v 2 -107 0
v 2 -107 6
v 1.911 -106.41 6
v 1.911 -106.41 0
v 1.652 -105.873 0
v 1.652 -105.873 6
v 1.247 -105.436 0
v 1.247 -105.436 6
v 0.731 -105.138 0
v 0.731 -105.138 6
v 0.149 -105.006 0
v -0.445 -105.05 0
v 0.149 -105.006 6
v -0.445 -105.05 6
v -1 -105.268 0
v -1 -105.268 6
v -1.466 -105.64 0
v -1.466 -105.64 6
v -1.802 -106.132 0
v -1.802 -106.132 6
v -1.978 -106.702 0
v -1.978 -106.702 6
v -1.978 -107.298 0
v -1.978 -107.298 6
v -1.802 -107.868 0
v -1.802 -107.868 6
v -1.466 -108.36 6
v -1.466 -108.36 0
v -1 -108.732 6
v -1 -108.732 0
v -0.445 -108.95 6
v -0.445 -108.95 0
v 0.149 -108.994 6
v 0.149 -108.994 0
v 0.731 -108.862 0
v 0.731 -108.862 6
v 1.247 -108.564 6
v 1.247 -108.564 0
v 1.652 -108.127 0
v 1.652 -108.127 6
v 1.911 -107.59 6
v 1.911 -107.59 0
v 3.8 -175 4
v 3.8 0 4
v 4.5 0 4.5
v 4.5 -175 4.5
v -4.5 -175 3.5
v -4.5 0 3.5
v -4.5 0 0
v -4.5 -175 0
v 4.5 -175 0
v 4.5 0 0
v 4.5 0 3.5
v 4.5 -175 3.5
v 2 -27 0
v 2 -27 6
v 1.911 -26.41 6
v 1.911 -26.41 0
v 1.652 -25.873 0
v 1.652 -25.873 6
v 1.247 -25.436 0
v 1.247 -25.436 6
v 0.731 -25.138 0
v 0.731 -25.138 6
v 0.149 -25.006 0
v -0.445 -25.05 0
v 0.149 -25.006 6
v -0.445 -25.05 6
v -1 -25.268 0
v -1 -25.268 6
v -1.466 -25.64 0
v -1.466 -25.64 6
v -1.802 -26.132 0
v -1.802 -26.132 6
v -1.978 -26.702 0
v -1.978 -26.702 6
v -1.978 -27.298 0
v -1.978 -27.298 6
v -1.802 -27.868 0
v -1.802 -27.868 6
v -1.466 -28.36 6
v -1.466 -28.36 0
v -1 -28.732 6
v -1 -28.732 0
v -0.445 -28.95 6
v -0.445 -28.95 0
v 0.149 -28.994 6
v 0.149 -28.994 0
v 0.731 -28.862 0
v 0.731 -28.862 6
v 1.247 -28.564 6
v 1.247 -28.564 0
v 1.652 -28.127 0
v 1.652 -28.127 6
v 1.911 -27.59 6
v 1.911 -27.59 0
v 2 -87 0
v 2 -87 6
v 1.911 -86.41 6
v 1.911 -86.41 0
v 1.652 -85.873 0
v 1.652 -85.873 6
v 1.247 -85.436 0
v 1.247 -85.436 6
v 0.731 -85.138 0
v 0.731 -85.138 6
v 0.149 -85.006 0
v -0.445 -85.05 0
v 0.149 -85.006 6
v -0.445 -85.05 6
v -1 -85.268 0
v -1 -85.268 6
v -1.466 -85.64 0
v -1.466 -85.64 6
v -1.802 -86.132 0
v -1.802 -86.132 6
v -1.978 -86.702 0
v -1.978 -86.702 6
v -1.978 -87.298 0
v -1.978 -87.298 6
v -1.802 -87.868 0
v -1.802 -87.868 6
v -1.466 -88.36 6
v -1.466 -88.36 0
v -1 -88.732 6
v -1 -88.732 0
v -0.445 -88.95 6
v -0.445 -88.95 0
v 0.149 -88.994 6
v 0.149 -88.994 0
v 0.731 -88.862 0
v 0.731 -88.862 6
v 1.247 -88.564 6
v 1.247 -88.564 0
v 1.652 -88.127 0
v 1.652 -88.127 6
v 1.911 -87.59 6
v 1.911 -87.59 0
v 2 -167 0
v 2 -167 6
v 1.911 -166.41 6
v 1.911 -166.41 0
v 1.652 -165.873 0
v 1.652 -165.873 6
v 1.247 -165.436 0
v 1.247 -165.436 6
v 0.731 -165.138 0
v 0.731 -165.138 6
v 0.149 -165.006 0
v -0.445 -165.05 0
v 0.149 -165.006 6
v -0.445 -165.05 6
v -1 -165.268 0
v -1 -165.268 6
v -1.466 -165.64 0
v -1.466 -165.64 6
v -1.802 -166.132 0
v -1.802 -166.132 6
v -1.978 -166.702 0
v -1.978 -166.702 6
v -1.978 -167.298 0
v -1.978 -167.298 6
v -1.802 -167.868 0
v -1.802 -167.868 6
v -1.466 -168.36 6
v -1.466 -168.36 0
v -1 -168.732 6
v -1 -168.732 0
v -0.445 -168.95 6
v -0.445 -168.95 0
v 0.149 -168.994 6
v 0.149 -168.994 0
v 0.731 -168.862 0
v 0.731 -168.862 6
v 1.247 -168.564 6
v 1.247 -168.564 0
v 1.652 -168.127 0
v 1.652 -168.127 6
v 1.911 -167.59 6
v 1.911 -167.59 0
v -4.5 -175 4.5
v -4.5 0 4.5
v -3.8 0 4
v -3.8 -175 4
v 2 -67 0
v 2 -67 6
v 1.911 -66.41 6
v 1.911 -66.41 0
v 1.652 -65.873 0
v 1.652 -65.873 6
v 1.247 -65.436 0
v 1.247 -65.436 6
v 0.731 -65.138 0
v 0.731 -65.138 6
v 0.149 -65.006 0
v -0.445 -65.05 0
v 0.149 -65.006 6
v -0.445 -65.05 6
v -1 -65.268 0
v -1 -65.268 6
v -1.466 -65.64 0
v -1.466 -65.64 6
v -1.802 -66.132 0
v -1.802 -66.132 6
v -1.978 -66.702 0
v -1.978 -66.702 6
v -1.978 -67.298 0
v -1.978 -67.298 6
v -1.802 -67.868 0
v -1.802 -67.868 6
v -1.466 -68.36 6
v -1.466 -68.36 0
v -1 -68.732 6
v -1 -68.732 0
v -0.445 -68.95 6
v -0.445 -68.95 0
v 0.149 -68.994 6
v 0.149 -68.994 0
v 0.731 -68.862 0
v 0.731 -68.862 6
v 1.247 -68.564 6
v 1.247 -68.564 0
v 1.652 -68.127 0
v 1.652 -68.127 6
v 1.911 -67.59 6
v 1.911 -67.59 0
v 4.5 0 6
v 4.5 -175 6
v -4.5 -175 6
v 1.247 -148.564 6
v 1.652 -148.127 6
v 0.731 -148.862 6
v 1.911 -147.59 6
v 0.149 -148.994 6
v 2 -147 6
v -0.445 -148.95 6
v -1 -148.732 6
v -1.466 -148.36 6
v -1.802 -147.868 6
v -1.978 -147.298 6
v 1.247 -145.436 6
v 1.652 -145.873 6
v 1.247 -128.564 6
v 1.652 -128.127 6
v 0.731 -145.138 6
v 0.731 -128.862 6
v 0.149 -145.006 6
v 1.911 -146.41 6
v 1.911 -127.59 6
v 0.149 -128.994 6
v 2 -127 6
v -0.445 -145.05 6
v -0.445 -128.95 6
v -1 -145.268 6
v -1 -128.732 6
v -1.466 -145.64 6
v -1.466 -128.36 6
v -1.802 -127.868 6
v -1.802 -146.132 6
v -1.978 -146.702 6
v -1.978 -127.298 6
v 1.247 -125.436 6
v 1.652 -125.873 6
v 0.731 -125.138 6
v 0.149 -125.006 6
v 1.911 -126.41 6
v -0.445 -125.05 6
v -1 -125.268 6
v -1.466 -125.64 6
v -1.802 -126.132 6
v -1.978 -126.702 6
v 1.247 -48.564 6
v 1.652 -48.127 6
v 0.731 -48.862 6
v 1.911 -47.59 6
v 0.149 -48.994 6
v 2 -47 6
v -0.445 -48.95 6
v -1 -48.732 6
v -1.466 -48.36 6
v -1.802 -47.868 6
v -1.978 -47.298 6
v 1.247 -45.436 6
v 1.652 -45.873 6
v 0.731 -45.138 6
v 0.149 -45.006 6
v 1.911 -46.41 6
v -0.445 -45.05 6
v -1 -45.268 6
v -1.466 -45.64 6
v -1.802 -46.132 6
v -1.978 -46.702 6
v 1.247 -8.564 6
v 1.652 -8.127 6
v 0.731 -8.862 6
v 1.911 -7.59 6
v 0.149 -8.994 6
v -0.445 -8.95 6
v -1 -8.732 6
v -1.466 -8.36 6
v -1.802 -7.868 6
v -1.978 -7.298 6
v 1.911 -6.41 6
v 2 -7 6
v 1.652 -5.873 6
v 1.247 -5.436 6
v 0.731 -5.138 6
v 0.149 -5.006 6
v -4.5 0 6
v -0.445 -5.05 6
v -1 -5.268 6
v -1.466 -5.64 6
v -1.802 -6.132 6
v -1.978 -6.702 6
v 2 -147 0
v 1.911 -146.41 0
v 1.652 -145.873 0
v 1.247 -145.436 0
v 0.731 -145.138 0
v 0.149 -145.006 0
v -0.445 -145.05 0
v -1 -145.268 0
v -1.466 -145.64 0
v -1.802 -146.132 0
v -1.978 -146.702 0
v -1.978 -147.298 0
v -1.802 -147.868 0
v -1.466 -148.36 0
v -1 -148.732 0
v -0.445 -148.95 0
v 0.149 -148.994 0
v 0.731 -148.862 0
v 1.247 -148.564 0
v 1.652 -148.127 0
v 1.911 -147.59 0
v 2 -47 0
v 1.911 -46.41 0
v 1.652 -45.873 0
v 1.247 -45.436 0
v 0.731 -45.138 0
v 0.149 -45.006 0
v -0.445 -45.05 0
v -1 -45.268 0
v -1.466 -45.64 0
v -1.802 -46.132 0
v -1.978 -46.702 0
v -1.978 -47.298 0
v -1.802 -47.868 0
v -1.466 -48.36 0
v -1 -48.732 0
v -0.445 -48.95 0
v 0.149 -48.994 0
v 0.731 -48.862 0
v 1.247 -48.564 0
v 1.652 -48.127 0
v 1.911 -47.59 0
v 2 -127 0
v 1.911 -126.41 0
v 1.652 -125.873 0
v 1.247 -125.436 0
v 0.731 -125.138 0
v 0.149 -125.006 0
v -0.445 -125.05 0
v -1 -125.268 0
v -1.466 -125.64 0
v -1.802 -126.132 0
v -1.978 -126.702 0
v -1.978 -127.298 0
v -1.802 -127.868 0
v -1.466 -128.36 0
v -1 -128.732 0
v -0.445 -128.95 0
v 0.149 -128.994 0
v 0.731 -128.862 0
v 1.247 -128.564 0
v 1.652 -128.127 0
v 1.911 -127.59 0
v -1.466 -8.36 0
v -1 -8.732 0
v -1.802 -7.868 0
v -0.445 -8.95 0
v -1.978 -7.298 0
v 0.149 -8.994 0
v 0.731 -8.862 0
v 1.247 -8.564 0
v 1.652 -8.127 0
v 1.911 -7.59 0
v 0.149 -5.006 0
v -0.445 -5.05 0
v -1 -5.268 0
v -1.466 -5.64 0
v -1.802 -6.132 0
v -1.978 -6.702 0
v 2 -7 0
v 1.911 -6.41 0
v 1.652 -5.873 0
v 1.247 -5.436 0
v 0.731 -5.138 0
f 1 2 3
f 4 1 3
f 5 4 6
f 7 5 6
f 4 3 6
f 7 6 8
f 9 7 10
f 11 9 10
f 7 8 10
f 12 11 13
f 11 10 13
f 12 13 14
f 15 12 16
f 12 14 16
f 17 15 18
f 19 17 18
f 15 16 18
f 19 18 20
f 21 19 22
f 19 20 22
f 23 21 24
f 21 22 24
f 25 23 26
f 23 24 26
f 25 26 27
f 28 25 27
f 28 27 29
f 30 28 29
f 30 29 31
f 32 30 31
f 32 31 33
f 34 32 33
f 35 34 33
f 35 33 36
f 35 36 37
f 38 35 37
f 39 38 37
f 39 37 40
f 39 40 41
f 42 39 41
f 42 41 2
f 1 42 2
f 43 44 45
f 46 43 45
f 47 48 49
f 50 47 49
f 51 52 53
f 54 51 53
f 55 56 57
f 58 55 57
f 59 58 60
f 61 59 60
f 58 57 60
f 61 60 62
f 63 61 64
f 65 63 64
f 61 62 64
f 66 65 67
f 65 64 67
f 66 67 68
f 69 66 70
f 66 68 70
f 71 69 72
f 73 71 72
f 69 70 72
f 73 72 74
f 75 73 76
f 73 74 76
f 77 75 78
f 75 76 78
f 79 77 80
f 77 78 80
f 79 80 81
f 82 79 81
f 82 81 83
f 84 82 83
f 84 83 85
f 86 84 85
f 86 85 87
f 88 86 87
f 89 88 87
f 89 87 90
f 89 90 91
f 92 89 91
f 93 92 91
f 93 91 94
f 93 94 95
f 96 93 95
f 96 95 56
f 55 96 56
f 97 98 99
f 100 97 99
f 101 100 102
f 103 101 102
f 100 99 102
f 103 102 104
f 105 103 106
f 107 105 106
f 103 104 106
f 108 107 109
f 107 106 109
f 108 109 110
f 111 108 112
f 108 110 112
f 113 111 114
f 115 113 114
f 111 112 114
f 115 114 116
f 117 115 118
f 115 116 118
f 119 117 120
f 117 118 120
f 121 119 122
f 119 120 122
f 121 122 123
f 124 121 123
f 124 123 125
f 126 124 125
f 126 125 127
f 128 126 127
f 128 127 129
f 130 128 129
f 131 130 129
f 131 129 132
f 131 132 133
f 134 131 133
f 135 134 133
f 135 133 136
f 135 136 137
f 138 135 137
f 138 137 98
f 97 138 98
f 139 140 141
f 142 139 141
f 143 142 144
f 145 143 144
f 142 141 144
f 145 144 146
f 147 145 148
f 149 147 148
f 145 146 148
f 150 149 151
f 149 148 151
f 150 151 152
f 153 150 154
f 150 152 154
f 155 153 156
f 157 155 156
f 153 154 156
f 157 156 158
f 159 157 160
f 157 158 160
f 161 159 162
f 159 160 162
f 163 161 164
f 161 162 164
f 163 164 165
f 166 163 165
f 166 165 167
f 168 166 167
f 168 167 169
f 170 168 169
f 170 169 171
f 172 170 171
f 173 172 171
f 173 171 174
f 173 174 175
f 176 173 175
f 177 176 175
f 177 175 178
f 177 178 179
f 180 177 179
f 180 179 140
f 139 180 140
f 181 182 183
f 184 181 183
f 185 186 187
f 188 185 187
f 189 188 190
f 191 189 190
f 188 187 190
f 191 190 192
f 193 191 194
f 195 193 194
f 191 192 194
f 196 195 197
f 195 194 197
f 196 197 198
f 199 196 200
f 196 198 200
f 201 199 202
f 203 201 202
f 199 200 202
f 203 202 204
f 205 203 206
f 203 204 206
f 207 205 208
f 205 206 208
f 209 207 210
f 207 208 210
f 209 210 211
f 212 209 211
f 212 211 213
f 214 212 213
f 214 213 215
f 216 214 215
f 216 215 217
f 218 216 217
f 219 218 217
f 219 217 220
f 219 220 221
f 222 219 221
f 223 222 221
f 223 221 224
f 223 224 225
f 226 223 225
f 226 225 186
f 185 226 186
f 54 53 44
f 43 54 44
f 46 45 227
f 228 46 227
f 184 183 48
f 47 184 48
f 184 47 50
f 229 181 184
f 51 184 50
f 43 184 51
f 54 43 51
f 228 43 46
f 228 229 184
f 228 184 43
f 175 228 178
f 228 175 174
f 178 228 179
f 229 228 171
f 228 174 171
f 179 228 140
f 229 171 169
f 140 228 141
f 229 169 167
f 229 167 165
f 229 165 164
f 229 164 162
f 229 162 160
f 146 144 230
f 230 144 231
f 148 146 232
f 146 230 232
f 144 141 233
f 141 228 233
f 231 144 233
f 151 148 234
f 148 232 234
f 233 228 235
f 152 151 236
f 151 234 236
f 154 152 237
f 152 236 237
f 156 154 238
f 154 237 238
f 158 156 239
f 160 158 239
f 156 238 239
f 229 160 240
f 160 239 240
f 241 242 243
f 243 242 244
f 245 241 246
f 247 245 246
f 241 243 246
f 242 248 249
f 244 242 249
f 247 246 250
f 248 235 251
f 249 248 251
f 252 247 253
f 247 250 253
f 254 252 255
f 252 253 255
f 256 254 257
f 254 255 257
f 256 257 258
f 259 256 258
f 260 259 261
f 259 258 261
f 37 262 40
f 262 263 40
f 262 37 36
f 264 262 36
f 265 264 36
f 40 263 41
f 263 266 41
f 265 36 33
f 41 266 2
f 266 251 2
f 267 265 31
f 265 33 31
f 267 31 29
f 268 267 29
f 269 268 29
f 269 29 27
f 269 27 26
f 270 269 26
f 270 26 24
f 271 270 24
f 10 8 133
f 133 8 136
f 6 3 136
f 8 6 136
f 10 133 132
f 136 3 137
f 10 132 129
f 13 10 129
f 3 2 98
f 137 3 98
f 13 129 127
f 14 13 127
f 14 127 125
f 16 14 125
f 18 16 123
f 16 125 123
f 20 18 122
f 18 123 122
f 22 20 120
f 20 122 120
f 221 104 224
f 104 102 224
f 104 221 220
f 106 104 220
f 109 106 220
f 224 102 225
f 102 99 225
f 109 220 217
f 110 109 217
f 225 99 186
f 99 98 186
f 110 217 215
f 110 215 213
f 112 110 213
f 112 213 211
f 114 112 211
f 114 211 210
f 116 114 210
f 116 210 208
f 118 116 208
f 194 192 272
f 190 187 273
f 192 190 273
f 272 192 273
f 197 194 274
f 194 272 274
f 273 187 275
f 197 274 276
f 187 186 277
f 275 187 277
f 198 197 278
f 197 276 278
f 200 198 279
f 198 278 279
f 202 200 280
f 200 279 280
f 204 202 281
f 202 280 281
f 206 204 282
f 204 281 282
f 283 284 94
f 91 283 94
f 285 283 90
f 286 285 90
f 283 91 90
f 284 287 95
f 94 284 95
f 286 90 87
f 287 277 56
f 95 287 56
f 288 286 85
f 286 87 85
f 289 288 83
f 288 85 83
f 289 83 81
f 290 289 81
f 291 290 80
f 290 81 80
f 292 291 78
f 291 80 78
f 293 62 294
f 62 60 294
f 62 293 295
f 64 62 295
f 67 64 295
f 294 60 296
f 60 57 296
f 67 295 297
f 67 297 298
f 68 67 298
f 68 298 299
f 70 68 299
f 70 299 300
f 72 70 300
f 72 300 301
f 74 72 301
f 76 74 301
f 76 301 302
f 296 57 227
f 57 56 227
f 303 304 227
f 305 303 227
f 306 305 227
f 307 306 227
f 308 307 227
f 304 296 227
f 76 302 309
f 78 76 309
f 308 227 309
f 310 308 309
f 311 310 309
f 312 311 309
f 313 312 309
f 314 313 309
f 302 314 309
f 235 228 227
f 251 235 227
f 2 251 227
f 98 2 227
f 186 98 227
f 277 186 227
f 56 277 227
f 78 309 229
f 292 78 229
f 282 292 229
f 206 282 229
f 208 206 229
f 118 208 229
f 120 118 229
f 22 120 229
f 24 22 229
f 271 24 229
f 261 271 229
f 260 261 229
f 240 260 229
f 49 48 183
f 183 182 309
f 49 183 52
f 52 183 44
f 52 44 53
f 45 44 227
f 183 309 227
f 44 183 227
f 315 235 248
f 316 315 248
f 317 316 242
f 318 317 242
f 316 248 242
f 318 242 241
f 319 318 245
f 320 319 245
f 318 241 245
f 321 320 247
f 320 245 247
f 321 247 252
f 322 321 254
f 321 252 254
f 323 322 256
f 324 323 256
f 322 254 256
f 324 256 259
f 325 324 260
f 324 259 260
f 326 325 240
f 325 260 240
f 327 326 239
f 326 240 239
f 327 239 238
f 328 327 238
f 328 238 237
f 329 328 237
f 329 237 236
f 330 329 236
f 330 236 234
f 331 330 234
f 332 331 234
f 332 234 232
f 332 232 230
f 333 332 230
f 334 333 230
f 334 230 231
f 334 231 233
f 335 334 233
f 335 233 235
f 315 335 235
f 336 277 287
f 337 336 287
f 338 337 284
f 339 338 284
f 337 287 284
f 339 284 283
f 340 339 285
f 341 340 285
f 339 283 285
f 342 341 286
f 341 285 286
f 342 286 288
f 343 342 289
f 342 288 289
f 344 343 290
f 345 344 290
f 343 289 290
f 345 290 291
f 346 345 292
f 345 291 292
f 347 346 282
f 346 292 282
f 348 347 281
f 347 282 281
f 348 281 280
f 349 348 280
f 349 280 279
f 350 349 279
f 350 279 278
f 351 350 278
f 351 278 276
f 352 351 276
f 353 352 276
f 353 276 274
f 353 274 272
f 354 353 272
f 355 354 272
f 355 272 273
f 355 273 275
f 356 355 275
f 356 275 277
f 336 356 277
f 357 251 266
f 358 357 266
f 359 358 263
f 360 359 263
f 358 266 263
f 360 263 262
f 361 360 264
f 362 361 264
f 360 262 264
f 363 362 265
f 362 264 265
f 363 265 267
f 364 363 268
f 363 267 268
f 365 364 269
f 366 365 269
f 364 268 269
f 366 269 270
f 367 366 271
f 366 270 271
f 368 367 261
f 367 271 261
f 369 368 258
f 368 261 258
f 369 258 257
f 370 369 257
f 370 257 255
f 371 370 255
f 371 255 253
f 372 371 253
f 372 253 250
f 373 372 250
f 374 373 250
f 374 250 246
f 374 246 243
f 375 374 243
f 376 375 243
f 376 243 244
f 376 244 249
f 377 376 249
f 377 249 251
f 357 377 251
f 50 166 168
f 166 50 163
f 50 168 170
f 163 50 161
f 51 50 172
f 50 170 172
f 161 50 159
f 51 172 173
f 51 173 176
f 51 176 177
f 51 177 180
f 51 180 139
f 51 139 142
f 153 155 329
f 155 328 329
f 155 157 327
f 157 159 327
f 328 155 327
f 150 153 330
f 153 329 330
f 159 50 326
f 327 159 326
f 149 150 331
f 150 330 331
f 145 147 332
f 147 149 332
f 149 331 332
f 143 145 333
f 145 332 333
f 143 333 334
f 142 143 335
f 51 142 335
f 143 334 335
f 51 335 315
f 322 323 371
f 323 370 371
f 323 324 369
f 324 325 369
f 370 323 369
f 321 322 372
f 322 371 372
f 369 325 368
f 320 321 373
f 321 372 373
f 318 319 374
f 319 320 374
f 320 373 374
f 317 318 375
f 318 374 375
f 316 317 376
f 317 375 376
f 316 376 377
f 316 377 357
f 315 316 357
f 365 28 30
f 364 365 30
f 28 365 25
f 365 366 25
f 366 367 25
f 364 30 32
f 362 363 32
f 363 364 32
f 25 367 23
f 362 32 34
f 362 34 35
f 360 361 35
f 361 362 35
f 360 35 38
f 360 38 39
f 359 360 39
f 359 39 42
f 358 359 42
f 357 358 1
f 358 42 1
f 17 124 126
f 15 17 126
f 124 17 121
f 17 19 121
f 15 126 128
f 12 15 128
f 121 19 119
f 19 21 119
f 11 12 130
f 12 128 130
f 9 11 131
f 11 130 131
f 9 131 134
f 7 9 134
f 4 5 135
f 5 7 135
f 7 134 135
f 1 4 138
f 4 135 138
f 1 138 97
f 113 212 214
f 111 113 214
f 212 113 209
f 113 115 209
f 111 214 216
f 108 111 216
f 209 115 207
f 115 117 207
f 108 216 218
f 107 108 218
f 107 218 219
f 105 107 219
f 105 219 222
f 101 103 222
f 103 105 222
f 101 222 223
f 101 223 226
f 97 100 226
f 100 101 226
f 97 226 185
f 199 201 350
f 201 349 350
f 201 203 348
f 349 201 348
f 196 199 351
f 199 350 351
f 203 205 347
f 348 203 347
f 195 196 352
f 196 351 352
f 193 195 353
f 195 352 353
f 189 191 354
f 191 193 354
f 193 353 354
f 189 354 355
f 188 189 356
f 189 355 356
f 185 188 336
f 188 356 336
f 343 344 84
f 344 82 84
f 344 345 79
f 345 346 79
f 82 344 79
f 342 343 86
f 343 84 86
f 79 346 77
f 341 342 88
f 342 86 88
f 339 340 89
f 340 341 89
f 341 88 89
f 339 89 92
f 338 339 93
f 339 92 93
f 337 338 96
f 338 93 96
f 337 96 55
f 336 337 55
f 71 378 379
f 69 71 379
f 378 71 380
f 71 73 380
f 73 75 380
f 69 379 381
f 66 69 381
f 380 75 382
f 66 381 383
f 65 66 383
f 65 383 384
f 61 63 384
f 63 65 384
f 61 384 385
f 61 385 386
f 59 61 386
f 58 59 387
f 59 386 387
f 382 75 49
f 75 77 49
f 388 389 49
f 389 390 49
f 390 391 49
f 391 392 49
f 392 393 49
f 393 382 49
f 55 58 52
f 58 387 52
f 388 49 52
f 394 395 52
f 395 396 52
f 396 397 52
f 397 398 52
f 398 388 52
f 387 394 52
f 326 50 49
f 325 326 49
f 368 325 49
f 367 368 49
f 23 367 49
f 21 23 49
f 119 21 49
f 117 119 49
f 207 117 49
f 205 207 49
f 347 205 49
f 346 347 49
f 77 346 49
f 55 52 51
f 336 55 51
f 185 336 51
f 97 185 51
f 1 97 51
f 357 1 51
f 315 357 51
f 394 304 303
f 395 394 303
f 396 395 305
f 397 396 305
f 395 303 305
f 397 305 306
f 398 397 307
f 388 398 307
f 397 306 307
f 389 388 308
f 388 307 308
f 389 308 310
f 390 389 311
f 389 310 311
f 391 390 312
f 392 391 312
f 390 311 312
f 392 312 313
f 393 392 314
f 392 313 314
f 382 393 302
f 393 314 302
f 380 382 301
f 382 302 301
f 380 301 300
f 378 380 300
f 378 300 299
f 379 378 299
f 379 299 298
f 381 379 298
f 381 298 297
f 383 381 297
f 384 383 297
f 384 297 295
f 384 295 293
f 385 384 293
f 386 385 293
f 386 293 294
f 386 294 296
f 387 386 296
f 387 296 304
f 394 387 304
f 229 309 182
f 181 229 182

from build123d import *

# Parameters (mm, degrees)
F1_DEPTH = 175
F2_R     = 2
F3_DEPTH = 6.001


with BuildPart() as f1:
    # F0 (on Front) → F1 (new body)
    with BuildSketch(Plane.XZ):
        Polygon((4.5, 6), (-4.5, 6), (-4.5, 4.5), (-3.8, 4), (-4.5, 3.5), (-4.5, 0), (4.5, 0), (4.5, 3.5), (3.8, 4), (4.5, 4.5), align=None)
    extrude(amount=F1_DEPTH)

    # F2 (on face) → F3 (cut, through all)
    with BuildSketch(Plane.XY.offset(6)):
        with Locations((0, -7)):
            Circle(F2_R)
        with Locations((0, -27)):
            Circle(F2_R)
        with Locations((0, -47)):
            Circle(F2_R)
        with Locations((0, -67)):
            Circle(F2_R)
        with Locations((0, -87)):
            Circle(F2_R)
        with Locations((0, -107)):
            Circle(F2_R)
        with Locations((0, -127)):
            Circle(F2_R)
        with Locations((0, -147)):
            Circle(F2_R)
        with Locations((0, -167)):
            Circle(F2_R)
    extrude(amount=-F3_DEPTH, mode=Mode.SUBTRACT)


solid = f1.part
